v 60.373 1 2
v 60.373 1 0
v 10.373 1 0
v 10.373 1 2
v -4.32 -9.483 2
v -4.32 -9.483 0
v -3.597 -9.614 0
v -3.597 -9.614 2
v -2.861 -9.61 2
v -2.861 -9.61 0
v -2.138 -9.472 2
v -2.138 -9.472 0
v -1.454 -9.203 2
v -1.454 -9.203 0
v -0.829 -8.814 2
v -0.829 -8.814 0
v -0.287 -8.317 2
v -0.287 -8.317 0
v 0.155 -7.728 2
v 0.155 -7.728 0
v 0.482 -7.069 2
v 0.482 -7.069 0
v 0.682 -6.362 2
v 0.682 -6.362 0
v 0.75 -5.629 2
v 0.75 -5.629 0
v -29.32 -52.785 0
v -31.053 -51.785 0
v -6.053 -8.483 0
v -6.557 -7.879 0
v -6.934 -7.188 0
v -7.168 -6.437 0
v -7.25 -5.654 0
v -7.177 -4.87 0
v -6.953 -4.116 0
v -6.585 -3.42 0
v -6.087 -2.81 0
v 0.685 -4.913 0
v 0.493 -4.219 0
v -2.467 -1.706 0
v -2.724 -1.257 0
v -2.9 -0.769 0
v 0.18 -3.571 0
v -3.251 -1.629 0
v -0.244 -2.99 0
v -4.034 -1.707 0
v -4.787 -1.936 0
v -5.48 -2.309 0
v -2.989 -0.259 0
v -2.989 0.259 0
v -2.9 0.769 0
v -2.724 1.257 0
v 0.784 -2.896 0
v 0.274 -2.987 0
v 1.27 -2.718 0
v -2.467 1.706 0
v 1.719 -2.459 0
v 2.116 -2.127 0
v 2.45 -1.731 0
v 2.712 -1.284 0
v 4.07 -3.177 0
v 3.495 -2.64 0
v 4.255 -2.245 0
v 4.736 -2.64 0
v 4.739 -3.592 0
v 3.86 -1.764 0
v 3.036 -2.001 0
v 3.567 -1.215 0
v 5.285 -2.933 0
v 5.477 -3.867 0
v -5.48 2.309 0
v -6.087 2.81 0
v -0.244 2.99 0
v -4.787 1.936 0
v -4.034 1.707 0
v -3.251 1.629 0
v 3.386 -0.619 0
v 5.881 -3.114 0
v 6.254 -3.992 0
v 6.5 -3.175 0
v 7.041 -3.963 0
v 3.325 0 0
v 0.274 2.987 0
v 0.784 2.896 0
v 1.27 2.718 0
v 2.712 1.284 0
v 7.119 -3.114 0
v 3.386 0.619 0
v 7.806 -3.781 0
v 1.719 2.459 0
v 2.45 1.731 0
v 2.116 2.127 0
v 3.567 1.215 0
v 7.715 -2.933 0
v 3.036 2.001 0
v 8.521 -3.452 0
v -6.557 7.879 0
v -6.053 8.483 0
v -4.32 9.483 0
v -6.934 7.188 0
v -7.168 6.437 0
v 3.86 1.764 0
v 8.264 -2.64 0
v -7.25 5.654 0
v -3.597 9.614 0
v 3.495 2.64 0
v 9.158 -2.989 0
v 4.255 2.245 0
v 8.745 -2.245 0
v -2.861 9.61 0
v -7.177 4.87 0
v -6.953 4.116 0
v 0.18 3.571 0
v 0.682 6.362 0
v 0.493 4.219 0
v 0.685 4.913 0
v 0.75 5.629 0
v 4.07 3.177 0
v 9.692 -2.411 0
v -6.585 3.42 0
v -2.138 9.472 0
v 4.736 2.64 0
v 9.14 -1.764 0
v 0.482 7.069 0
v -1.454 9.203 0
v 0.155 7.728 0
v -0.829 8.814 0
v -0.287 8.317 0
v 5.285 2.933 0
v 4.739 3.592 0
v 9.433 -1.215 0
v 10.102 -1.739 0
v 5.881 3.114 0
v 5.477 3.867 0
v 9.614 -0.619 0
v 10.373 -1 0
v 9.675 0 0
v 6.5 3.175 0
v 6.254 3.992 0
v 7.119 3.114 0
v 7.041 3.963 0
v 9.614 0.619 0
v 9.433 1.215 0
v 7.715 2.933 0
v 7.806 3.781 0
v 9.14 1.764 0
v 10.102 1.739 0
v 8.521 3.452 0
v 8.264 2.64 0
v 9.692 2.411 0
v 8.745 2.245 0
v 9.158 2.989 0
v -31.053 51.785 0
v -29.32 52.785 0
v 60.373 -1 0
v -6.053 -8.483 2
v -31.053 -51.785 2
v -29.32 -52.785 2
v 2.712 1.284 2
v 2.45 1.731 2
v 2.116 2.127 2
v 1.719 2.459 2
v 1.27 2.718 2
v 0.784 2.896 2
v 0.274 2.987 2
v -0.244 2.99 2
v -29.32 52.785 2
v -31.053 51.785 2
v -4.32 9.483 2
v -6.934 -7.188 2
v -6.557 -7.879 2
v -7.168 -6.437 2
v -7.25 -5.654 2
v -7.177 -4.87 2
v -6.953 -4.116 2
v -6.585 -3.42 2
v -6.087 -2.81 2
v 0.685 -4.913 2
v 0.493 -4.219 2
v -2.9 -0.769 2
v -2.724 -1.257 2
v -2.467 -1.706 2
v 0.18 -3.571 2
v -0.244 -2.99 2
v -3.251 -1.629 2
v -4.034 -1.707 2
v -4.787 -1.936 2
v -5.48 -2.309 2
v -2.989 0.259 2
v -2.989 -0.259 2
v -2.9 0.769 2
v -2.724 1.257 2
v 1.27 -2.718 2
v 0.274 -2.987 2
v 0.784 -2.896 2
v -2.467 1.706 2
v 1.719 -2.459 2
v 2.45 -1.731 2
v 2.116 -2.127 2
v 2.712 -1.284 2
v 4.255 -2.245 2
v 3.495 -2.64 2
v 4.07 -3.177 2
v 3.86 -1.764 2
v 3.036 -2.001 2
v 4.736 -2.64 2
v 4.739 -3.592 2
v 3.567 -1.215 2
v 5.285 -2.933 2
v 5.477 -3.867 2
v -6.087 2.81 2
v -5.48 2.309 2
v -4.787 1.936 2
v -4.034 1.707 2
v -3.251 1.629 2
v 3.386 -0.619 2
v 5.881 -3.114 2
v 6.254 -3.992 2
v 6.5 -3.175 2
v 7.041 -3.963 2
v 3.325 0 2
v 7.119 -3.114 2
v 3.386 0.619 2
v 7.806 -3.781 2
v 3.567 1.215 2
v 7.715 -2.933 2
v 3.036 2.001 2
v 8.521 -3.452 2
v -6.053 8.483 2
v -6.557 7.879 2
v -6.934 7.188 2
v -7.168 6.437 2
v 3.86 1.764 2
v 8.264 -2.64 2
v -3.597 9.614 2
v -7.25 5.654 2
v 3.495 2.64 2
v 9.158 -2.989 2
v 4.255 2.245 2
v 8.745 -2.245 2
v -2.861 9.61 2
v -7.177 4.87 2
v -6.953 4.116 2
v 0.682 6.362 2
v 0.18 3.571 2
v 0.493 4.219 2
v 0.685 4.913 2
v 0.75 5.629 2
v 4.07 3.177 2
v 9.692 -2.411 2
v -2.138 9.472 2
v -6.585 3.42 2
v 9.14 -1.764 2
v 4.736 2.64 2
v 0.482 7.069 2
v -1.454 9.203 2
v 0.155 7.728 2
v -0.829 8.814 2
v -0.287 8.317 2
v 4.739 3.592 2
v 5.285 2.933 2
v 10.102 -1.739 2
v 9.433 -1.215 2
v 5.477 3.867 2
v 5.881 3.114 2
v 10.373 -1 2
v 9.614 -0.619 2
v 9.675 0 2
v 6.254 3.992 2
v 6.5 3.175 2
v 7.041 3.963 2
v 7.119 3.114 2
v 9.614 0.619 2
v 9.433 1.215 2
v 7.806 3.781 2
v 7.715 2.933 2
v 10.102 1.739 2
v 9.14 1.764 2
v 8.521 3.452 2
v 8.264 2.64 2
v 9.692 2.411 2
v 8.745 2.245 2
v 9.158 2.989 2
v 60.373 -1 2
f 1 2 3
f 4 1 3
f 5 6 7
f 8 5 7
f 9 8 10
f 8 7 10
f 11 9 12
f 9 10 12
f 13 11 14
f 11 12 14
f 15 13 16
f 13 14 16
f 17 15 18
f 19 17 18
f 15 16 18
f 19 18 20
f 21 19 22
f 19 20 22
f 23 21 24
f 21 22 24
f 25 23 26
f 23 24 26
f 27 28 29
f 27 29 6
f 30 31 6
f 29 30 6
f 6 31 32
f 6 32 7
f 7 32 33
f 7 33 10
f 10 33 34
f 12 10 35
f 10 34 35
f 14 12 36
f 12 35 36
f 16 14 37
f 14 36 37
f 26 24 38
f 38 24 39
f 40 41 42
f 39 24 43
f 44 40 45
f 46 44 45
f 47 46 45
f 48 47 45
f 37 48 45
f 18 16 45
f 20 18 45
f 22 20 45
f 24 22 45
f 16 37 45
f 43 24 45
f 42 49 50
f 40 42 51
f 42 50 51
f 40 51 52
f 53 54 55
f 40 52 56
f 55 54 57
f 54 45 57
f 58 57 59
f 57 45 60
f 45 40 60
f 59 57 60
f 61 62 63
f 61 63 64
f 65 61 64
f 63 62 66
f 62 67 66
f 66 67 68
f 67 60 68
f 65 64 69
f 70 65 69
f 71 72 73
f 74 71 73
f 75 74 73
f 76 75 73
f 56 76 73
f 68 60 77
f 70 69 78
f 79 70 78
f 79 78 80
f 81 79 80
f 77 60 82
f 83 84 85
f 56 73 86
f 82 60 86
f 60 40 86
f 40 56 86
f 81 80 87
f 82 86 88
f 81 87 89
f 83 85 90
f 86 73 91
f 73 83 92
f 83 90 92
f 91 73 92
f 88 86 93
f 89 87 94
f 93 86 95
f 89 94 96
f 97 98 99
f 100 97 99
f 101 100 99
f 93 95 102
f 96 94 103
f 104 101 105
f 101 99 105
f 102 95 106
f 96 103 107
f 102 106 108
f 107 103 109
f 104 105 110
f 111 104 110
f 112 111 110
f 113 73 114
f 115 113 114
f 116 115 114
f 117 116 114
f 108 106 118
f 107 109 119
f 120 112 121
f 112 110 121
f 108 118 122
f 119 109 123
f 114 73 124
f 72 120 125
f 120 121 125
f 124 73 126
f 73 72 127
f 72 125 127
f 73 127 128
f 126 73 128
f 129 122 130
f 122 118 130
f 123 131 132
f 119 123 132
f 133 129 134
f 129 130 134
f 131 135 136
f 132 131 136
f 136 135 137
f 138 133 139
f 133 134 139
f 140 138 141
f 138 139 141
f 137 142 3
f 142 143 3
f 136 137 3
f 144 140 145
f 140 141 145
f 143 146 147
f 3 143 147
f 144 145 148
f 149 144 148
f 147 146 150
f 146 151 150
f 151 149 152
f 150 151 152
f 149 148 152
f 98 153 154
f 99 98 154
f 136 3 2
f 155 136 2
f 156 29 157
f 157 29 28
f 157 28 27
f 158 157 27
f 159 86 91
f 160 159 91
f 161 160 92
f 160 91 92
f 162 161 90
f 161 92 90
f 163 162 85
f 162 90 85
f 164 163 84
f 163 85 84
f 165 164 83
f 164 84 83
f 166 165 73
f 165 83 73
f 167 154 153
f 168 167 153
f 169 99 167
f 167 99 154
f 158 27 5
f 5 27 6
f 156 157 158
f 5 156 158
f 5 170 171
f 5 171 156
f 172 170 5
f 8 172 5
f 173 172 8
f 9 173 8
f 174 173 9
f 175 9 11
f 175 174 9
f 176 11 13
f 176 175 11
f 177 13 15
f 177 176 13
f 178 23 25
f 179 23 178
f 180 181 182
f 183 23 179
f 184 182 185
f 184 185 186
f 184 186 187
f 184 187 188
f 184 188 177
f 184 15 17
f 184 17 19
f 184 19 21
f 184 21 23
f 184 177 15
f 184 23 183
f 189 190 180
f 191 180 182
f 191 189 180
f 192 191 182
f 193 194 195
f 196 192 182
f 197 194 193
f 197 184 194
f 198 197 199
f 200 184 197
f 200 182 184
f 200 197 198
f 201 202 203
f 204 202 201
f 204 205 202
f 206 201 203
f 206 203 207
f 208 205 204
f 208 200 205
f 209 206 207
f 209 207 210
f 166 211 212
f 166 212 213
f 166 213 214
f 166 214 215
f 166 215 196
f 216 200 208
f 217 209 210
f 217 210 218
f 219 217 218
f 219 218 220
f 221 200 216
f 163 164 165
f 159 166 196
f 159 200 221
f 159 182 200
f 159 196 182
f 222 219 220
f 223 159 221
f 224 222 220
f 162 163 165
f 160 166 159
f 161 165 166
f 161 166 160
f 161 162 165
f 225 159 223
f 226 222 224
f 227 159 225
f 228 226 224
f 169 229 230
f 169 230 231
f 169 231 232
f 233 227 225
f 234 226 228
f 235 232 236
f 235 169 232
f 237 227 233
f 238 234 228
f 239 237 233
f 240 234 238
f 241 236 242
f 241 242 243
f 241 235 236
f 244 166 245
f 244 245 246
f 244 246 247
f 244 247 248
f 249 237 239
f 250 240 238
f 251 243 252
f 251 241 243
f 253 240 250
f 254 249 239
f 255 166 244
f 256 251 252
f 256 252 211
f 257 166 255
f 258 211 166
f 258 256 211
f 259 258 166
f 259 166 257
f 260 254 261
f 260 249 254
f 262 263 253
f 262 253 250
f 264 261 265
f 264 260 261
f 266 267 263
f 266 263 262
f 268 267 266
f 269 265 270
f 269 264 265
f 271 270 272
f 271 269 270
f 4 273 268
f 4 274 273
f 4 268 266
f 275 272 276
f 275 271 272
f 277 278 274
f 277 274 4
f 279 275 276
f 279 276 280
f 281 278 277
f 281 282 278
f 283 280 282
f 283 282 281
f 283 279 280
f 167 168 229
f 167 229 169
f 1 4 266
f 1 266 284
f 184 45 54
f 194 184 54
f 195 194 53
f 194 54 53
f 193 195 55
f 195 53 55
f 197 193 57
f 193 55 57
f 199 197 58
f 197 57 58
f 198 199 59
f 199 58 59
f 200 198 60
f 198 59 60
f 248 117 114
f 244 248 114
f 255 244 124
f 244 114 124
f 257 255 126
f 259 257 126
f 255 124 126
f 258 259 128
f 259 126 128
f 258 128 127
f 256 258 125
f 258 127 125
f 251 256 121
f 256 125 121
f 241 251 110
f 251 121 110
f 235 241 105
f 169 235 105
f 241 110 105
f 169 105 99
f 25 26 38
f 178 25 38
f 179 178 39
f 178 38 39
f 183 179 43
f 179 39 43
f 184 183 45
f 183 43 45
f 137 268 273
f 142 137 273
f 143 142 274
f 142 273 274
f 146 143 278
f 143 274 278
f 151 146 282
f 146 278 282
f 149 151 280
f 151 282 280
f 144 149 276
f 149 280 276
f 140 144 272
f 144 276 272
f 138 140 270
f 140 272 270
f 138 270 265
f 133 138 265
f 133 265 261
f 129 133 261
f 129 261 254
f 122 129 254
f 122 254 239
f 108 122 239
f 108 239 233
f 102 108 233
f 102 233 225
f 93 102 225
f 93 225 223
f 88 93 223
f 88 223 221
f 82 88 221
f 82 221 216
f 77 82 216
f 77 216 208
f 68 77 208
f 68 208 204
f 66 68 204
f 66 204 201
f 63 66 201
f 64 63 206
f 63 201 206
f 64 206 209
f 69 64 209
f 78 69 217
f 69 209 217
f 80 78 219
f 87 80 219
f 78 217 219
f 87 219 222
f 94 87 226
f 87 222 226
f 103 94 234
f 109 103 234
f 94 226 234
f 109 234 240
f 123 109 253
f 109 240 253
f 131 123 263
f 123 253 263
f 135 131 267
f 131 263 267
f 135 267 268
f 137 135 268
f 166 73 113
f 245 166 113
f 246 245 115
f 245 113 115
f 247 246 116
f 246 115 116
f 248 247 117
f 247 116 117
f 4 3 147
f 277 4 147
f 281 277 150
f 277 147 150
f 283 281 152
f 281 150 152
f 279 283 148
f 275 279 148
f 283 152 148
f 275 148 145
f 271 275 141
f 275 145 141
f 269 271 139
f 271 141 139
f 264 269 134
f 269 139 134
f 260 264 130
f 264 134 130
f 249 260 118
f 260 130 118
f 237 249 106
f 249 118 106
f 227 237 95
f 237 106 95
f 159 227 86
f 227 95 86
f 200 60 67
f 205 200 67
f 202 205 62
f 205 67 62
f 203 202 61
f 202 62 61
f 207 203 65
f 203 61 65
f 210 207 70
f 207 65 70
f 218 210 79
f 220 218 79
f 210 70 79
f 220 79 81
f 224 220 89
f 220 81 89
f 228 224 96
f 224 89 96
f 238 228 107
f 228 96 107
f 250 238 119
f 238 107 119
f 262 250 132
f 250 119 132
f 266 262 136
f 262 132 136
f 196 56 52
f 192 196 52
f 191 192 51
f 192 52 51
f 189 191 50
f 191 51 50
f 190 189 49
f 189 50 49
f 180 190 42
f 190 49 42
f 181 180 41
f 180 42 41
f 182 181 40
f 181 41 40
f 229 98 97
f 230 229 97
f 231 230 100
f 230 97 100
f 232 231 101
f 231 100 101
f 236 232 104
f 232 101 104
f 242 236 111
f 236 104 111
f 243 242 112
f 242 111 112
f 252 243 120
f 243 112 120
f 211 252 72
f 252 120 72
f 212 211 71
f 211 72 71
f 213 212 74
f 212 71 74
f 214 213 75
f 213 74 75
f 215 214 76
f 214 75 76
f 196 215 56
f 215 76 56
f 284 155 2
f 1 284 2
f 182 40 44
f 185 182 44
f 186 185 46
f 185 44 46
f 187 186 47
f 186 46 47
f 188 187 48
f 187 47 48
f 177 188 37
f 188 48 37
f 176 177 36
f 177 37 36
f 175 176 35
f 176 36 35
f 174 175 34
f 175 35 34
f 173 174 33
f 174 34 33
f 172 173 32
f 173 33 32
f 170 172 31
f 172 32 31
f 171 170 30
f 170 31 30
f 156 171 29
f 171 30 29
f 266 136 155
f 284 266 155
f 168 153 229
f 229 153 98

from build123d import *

# Parameters (mm, degrees)
F1_DEPTH = 2
F2_R     = 3.175
F3_DEPTH = 25


with BuildPart() as f1:
    # F0 (on Top) → F1 (new body)
    with BuildSketch(Plane.XY):
        with BuildLine():
            ThreePointArc((2.7115384615, -1.2835728151), (2.9269963601, -0.6577935145), (3, 0))
            ThreePointArc((3, 0), (2.9269963601, 0.6577935145), (2.7115384615, 1.2835728151))
            ThreePointArc((2.7115384615, 1.2835728151), (2.5, 0), (2.7115384615, -1.2835728151))
        make_face()
        with BuildLine():
            ThreePointArc((2.7115384615, -1.2835728151), (2.5, 0), (2.7115384615, 1.2835728151))
            ThreePointArc((2.7115384615, 1.2835728151), (1.5, 2.5980762114), (-0.2441625653, 2.9900475986))
            ThreePointArc((-0.2441625653, 2.9900475986), (-1.25, 2.1650635095), (-2.4673758962, 1.7064747835))
            ThreePointArc((-2.4673758962, 1.7064747835), (-3, 0), (-2.4673758962, -1.7064747835))
            ThreePointArc((-2.4673758962, -1.7064747835), (-1.25, -2.1650635095), (-0.2441625653, -2.9900475986))
            ThreePointArc((-0.2441625653, -2.9900475986), (1.5, -2.5980762114), (2.7115384615, -1.2835728151))
        make_face()
        with BuildLine():
            ThreePointArc((-2.4673758962, 1.7064747835), (-1.5, 2.5980762114), (-0.2441625653, 2.9900475986))
            ThreePointArc((-0.2441625653, 2.9900475986), (0.4932171817, 4.2190852933), (0.75, 5.6291651246))
            ThreePointArc((0.75, 5.6291651246), (-0.8294489344, 8.8136482127), (-4.3204662693, 9.4832670908))
            Line((-4.3204662693, 9.4832670908), (-6.0525170769, 8.4832670908))
            ThreePointArc((-6.0525170769, 8.4832670908), (-6.7857064923, 3.7586626253), (-2.4673758962, 1.7064747835))
        make_face()
        with BuildLine():
            ThreePointArc((-2.4673758962, 1.7064747835), (-1.25, 2.1650635095), (-0.2441625653, 2.9900475986))
            ThreePointArc((-0.2441625653, 2.9900475986), (-1.5, 2.5980762114), (-2.4673758962, 1.7064747835))
        make_face()
        with BuildLine():
            ThreePointArc((-2.4673758962, -1.7064747835), (-1.5, -2.5980762114), (-0.2441625653, -2.9900475986))
            ThreePointArc((-0.2441625653, -2.9900475986), (-1.25, -2.1650635095), (-2.4673758962, -1.7064747835))
        make_face()
        with BuildLine():
            ThreePointArc((0.75, -5.6291651246), (0.4932171817, -4.2190852933), (-0.2441625653, -2.9900475986))
            ThreePointArc((-0.2441625653, -2.9900475986), (-1.5, -2.5980762114), (-2.4673758962, -1.7064747835))
            ThreePointArc((-2.4673758962, -1.7064747835), (-6.7857064923, -3.7586626253), (-6.0525170769, -8.4832670908))
            Line((-6.0525170769, -8.4832670908), (-4.3204662693, -9.4832670908))
            ThreePointArc((-4.3204662693, -9.4832670908), (-0.8294489344, -8.8136482127), (0.75, -5.6291651246))
        make_face()
        with BuildLine():
            ThreePointArc((2.7115384615, 1.2835728151), (2.9269963601, 0.6577935145), (3, 0))
            ThreePointArc((3, 0), (2.9269963601, -0.6577935145), (2.7115384615, -1.2835728151))
            ThreePointArc((2.7115384615, -1.2835728151), (6.6479505639, -3.9972628924), (10.3729833462, -1))
            Line((10.3729833462, -1), (10.3729833462, 1))
            ThreePointArc((10.3729833462, 1), (6.6479505639, 3.9972628924), (2.7115384615, 1.2835728151))
        make_face()
        with BuildLine():
            Line((60.3729833462, 1), (10.3729833462, 1))
            ThreePointArc((10.3729833462, 1), (10.4681187851, 0.5040171699), (10.5, 0))
            ThreePointArc((10.5, 0), (10.4681187851, -0.5040171699), (10.3729833462, -1))
            Line((10.3729833462, -1), (60.3729833462, -1))
            Line((60.3729833462, -1), (60.3729833462, 1))
        make_face()
        with BuildLine():
            ThreePointArc((10.5, 0), (10.4681187851, 0.5040171699), (10.3729833462, 1))
            Line((10.3729833462, 1), (10.3729833462, -1))
            ThreePointArc((10.3729833462, -1), (10.4681187851, -0.5040171699), (10.5, 0))
        make_face()
        with BuildLine():
            Line((-4.3204662693, -9.4832670908), (-6.0525170769, -8.4832670908))
            ThreePointArc((-6.0525170769, -8.4832670908), (-5.25, -9.0932667397), (-4.3204662693, -9.4832670908))
        make_face()
        with BuildLine():
            ThreePointArc((-4.3204662693, -9.4832670908), (-5.25, -9.0932667397), (-6.0525170769, -8.4832670908))
            Line((-6.0525170769, -8.4832670908), (-31.0525170769, -51.7845372801))
            Line((-31.0525170769, -51.7845372801), (-29.3204662693, -52.7845372801))
            Line((-29.3204662693, -52.7845372801), (-4.3204662693, -9.4832670908))
        make_face()
        with BuildLine():
            ThreePointArc((-4.3204662693, 9.4832670908), (-5.25, 9.0932667397), (-6.0525170769, 8.4832670908))
            Line((-6.0525170769, 8.4832670908), (-4.3204662693, 9.4832670908))
        make_face()
        with BuildLine():
            Line((-31.0525170769, 51.7845372801), (-6.0525170769, 8.4832670908))
            ThreePointArc((-6.0525170769, 8.4832670908), (-5.25, 9.0932667397), (-4.3204662693, 9.4832670908))
            Line((-4.3204662693, 9.4832670908), (-29.3204662693, 52.7845372801))
            Line((-29.3204662693, 52.7845372801), (-31.0525170769, 51.7845372801))
        make_face()
    extrude(amount=F1_DEPTH)

    # F2 (on face) → F3 (cut)
    with BuildSketch(Plane.XY.offset(2)):
        with Locations((6.5, 0)):
            Circle(F2_R)
    extrude(amount=-F3_DEPTH, mode=Mode.SUBTRACT)


solid = f1.part
